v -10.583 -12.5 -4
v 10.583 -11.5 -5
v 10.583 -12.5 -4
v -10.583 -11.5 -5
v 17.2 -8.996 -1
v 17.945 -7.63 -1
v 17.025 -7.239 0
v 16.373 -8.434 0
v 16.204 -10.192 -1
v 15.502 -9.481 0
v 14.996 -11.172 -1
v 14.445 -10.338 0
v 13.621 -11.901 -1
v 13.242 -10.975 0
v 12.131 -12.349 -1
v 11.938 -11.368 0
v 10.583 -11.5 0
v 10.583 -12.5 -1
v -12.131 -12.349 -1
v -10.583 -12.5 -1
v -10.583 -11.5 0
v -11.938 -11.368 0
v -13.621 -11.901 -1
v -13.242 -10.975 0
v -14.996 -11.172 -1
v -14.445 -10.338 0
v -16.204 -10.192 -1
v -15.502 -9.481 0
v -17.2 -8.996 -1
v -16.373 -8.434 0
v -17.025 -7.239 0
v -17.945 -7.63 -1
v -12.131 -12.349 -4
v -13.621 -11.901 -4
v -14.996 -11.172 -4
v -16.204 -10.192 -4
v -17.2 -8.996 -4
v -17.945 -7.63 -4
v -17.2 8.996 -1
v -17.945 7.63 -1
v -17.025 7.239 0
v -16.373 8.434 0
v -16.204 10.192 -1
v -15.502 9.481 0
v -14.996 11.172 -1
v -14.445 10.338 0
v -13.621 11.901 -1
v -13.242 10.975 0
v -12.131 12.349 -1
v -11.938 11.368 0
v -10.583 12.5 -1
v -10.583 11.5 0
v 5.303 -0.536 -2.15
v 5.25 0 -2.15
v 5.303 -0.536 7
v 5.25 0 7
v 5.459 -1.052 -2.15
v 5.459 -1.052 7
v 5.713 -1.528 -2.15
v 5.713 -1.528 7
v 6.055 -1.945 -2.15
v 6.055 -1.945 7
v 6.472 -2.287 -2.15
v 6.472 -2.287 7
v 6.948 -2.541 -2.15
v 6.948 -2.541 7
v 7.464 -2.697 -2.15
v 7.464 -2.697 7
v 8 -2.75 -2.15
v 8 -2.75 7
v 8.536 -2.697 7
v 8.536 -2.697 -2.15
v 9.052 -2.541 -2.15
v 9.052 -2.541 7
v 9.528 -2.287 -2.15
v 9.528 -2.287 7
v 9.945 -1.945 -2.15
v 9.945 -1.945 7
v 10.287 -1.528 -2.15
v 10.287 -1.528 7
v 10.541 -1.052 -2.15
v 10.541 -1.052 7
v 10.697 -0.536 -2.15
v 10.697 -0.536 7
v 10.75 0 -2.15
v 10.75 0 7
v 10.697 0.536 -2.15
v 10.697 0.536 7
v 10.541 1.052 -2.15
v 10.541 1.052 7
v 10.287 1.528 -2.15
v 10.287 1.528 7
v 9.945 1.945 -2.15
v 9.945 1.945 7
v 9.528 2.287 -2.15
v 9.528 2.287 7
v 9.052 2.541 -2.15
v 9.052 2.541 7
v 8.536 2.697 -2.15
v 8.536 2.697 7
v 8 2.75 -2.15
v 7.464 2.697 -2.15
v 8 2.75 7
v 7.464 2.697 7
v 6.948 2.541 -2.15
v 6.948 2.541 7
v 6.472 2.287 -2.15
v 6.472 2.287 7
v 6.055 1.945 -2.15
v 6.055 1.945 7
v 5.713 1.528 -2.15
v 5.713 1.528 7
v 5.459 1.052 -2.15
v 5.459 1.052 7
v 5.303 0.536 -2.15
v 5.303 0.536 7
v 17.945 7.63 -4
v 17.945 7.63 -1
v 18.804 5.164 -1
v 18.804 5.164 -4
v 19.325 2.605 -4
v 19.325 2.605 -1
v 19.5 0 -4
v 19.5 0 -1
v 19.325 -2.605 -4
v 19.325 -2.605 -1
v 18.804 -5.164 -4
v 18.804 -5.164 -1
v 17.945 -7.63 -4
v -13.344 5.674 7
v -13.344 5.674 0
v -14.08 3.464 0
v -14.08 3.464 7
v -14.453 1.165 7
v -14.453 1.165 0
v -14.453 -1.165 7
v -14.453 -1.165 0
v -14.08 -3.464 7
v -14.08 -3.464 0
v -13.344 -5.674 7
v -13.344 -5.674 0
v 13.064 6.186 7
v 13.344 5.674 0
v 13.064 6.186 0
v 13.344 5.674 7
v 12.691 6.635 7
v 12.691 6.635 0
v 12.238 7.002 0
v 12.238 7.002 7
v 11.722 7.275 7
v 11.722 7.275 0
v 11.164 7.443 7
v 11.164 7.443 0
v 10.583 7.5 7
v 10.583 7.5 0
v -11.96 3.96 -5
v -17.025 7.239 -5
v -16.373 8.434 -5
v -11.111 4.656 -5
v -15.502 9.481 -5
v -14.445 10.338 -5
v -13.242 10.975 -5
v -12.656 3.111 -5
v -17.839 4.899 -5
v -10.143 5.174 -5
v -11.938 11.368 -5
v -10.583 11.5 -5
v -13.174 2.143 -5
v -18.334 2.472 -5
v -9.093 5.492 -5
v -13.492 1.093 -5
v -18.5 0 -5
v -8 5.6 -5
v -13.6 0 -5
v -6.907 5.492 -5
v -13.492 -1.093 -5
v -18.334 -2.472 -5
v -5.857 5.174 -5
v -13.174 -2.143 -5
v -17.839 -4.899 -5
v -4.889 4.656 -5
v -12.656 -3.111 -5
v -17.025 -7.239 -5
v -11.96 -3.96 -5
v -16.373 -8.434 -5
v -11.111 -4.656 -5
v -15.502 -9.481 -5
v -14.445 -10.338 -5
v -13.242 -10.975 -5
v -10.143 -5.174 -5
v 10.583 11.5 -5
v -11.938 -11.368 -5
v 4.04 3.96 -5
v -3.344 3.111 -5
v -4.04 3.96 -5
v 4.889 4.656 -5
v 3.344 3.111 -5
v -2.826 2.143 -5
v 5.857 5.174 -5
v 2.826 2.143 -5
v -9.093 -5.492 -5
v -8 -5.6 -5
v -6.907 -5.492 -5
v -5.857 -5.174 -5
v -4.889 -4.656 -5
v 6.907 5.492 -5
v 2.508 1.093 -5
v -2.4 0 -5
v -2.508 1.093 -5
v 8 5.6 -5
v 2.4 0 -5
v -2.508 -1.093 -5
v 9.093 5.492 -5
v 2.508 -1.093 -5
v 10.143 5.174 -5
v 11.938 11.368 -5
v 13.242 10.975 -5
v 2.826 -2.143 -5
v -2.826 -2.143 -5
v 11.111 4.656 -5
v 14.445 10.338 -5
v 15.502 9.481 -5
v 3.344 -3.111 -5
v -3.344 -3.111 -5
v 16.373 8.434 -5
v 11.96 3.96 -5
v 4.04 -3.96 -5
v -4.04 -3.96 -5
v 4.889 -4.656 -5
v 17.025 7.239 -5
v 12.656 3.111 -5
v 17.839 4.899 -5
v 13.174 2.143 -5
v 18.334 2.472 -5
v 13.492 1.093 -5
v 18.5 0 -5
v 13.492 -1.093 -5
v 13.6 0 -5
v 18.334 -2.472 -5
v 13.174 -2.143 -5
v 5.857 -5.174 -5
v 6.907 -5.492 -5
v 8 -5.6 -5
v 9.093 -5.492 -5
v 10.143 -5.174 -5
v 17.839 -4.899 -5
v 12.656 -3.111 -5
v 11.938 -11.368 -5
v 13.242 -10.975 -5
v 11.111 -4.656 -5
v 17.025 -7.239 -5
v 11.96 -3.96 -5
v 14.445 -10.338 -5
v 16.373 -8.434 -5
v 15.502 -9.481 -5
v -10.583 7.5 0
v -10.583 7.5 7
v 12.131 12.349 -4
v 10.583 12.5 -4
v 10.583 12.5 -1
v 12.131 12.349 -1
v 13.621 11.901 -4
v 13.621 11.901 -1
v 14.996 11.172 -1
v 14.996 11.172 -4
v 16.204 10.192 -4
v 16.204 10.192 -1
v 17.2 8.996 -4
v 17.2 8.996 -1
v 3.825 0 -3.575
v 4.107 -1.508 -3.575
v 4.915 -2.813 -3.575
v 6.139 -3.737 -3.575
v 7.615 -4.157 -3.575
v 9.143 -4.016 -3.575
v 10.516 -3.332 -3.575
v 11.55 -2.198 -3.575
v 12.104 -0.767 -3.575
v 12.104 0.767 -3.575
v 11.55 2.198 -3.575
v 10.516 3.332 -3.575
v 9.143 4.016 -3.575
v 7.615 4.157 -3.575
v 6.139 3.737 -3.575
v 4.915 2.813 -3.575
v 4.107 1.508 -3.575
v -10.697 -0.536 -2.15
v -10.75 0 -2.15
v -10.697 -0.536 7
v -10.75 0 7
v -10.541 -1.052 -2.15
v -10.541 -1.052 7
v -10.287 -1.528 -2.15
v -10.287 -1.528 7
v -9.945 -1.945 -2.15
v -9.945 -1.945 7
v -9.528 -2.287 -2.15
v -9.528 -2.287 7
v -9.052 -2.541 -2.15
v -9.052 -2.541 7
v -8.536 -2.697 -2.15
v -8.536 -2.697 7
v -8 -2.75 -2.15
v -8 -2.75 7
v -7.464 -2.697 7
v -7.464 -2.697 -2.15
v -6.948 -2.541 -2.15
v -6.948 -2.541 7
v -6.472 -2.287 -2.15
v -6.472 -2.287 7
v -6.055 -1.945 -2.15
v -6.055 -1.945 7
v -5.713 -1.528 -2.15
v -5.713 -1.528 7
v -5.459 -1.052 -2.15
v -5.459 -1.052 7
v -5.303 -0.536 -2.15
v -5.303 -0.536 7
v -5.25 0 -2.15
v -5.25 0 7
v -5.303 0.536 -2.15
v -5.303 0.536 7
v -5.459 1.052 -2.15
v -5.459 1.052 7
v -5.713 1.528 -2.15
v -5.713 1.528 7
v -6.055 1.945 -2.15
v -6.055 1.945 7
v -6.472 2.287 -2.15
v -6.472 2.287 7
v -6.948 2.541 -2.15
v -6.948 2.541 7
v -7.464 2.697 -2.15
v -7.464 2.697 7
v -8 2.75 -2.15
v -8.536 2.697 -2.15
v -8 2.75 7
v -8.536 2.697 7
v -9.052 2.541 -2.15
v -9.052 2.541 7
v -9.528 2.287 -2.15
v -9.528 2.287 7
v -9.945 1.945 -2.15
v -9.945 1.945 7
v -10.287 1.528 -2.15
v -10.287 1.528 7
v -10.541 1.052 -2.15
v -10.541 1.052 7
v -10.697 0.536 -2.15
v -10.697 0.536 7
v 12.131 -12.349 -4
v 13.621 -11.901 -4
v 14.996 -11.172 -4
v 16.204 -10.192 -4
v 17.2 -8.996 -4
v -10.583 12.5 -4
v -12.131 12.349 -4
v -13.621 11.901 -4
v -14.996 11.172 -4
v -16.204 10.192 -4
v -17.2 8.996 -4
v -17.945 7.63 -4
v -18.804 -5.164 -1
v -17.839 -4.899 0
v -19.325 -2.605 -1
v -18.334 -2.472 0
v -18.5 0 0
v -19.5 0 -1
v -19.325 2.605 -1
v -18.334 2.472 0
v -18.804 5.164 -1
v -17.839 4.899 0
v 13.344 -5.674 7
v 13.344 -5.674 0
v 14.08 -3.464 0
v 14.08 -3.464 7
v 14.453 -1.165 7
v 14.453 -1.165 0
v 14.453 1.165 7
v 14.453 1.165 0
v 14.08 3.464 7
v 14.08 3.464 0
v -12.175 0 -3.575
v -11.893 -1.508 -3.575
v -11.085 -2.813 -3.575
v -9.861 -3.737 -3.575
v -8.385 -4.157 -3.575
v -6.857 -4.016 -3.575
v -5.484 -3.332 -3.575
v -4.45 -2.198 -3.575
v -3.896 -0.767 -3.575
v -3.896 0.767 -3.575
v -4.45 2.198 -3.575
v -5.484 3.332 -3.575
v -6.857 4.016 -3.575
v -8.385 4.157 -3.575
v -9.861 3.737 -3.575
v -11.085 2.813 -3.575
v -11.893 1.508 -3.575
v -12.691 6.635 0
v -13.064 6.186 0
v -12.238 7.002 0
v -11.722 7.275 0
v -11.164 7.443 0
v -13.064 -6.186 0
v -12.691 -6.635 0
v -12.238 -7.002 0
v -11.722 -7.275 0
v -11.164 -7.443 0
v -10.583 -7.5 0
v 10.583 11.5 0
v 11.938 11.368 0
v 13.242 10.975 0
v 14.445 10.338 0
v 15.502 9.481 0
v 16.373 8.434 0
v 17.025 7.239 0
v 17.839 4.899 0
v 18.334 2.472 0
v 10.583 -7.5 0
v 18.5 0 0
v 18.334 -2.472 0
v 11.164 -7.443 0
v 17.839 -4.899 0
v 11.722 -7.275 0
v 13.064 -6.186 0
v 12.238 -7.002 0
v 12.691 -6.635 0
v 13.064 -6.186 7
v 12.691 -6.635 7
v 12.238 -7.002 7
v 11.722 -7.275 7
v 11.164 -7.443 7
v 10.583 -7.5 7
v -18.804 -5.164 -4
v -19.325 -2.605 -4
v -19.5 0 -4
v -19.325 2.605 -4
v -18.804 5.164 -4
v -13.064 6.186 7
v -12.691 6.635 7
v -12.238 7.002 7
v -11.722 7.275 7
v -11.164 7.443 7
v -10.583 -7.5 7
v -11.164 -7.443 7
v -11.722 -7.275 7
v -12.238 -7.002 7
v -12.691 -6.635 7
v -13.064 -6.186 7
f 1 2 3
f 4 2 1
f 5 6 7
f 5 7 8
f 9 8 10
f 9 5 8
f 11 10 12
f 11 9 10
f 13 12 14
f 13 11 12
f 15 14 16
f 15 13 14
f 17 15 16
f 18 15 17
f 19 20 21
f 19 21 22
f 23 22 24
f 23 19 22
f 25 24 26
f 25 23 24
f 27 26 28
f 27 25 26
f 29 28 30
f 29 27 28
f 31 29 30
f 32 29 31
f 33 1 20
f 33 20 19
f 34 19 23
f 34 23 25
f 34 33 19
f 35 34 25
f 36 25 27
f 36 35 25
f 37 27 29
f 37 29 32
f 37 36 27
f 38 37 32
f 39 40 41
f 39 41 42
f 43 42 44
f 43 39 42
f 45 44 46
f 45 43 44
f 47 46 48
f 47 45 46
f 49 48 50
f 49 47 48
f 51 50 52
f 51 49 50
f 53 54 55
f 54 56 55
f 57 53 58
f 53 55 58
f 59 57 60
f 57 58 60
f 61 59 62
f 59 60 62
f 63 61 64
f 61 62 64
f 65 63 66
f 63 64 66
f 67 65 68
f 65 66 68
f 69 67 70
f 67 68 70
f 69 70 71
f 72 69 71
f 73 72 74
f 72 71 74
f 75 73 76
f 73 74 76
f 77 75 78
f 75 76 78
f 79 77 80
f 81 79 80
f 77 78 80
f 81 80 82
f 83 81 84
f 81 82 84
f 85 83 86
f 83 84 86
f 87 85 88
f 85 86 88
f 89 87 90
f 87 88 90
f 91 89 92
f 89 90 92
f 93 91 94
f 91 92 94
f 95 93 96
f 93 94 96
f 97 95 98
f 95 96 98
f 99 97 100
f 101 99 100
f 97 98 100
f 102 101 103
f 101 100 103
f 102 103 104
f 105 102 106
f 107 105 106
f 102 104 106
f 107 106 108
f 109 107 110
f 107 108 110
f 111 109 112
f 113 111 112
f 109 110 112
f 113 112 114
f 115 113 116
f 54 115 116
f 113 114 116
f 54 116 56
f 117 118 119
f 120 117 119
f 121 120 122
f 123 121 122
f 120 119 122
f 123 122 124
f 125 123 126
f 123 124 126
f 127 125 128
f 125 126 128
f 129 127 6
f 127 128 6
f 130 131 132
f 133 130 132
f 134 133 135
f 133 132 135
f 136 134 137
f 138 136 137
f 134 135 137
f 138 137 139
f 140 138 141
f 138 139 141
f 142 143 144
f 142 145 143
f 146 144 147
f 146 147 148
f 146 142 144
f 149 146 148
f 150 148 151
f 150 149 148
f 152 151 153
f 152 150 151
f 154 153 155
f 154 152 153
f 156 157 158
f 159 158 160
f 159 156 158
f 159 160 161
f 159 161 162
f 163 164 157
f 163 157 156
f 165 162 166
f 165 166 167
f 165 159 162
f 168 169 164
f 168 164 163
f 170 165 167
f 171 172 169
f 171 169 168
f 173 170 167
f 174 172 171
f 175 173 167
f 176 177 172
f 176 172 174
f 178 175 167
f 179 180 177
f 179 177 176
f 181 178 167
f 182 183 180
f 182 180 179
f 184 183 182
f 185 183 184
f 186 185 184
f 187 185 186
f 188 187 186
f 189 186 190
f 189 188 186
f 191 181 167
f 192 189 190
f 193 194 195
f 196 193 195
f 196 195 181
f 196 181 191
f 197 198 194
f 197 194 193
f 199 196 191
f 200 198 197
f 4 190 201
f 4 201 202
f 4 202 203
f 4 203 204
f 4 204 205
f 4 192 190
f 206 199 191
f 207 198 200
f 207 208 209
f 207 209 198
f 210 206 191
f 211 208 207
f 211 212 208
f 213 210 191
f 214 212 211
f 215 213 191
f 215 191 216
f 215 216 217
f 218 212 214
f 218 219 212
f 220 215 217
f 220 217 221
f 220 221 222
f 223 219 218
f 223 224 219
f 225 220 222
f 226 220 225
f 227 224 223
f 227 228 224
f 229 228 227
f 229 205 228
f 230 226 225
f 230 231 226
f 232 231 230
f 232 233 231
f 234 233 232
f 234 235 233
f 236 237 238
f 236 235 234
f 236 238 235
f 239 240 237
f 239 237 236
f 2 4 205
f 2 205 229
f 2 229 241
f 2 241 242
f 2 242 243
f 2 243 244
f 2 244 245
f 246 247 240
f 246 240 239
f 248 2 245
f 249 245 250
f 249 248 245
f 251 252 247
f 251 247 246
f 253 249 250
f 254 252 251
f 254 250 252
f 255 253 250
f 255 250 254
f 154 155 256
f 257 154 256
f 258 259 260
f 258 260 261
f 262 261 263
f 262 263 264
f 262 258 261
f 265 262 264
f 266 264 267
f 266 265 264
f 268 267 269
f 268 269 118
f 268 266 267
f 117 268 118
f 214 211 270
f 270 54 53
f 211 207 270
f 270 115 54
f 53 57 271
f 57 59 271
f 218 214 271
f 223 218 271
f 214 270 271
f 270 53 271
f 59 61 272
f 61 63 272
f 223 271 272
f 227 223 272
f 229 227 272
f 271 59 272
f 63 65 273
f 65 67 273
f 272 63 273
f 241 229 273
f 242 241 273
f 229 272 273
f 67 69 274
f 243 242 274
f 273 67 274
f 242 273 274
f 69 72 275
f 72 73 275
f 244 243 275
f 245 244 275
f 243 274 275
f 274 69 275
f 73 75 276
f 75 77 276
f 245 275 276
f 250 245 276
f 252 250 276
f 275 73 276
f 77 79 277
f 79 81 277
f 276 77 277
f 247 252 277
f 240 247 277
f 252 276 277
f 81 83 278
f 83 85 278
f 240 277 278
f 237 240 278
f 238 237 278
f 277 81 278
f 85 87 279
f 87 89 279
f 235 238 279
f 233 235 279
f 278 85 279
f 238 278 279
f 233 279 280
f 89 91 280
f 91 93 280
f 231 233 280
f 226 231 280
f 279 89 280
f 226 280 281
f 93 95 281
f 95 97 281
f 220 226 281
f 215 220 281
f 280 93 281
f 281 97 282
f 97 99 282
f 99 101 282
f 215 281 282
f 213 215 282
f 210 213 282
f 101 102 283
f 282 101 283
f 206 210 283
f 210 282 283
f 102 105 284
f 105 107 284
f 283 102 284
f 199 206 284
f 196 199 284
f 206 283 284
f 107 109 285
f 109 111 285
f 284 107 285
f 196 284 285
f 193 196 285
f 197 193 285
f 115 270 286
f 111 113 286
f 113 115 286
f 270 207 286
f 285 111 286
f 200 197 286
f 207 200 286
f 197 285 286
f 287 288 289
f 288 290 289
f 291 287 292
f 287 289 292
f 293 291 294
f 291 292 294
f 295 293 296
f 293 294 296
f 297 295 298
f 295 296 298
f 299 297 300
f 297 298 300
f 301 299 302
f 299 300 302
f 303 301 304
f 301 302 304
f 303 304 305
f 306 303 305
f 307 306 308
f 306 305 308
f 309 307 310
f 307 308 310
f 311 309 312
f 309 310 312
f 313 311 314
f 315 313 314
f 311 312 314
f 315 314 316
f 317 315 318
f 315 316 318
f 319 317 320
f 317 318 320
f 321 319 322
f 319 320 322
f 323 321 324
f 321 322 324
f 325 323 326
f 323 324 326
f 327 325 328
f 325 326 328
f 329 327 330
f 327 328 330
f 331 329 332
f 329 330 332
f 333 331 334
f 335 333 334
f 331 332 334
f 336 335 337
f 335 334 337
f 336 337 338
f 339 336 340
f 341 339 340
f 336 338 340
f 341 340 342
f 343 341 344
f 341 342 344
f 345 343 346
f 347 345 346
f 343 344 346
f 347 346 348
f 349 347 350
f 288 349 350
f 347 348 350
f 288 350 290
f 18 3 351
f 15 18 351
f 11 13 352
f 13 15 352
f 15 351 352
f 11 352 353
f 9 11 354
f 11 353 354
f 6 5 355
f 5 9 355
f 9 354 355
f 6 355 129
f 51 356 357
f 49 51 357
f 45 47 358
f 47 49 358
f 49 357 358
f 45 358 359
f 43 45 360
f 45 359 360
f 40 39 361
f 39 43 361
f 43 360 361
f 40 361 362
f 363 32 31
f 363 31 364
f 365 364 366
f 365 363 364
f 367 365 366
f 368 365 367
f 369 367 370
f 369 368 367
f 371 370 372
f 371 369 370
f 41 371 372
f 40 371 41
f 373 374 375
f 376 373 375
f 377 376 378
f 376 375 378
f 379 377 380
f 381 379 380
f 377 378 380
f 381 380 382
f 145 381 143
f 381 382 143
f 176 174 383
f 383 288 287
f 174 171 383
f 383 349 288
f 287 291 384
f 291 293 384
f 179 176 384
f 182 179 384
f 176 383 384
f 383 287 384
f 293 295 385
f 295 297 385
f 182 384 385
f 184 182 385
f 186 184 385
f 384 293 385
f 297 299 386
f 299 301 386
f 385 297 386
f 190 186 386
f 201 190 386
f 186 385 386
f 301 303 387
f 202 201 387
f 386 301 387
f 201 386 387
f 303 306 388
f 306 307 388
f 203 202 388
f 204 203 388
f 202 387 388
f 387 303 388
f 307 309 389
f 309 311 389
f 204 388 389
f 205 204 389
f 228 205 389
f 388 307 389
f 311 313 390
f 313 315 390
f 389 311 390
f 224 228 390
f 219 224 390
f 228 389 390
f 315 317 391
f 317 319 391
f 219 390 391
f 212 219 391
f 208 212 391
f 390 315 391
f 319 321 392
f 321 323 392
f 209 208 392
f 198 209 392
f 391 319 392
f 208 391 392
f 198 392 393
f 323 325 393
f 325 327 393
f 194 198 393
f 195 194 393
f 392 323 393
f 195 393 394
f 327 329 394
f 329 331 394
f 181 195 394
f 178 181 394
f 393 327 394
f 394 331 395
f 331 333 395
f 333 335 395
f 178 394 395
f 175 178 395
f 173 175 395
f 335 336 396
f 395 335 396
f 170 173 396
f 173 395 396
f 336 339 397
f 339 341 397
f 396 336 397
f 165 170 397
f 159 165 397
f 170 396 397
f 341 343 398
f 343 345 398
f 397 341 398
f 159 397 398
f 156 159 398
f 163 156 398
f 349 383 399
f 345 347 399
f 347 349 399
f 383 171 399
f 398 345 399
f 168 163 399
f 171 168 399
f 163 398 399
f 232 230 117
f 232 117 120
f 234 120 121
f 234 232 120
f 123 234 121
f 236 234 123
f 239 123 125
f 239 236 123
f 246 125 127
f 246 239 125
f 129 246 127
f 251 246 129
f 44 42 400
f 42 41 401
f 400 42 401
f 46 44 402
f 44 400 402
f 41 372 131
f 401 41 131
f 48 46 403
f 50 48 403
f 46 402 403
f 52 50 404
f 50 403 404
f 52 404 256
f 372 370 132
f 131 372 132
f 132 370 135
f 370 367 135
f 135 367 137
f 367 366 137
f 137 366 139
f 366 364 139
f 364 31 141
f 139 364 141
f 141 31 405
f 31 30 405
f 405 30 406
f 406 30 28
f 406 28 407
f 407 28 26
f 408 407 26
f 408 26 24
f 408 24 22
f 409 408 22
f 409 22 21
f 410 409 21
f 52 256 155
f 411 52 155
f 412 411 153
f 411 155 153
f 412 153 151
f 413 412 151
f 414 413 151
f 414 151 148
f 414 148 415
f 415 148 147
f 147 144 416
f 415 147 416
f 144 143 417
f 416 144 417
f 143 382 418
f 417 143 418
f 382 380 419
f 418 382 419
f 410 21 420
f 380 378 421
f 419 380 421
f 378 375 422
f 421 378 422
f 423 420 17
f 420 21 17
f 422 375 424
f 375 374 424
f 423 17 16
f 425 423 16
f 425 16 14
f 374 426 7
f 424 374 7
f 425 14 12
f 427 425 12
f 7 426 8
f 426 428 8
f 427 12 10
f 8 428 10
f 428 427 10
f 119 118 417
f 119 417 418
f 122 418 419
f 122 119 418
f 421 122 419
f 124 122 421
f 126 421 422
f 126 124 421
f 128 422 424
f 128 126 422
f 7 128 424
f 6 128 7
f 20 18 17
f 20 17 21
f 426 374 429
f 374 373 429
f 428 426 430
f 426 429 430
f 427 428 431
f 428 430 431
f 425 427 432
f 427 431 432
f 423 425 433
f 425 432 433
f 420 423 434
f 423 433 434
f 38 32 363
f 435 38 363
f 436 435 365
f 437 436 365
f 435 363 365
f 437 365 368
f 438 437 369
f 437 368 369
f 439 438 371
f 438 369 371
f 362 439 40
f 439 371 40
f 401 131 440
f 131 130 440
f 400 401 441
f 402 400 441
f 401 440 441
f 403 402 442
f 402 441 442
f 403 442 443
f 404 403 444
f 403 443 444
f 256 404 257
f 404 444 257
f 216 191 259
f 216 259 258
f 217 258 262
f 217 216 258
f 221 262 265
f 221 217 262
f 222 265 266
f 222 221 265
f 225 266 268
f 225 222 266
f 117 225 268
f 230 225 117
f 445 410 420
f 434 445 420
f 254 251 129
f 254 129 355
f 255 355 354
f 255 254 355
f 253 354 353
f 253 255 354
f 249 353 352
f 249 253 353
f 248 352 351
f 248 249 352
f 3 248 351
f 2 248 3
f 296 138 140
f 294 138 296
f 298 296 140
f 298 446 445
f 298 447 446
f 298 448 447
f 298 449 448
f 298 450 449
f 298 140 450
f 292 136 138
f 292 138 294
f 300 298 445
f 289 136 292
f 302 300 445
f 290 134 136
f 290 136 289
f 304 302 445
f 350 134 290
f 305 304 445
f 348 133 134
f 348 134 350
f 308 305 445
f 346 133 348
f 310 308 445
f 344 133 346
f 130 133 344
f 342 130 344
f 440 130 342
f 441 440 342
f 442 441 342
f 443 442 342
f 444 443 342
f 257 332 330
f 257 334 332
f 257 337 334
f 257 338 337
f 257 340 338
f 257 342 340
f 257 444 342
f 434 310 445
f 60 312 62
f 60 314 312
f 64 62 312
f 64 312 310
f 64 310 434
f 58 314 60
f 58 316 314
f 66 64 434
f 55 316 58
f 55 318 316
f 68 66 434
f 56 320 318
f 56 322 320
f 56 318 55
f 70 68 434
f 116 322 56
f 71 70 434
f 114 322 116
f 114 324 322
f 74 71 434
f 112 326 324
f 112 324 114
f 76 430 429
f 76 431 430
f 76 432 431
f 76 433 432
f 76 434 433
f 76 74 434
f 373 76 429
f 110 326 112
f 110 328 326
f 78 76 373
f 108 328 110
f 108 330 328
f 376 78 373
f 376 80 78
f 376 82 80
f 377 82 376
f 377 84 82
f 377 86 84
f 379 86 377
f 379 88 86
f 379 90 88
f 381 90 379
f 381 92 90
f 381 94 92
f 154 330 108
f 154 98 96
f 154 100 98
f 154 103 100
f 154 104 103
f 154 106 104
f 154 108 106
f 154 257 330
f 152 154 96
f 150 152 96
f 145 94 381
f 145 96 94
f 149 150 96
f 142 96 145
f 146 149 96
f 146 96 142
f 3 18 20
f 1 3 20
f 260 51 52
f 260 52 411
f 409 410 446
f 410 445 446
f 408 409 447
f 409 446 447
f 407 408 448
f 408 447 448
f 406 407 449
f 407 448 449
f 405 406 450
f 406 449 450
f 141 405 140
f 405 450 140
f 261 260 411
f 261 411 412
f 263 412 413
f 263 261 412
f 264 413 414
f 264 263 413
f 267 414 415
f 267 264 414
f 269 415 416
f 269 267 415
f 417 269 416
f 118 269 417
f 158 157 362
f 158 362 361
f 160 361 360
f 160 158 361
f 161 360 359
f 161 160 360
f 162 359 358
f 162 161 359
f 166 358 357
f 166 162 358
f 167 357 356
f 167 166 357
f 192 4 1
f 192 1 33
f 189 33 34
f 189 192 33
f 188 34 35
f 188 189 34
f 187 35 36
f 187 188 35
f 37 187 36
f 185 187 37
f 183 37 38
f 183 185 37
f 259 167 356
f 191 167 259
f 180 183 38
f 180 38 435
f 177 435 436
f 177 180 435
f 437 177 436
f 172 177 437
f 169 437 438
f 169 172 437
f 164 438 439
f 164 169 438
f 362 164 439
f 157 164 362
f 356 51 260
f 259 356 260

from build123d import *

# Parameters (mm, degrees)
F1_DEPTH       = 7
F3_DEPTH       = 5
F5_D           = 5.5
F5_CSINK_D     = 11.2
F5_CSINK_ANGLE = 90
F6_R           = 8
F7_R           = 3
F8_SIZE        = 1


with BuildPart() as f1:
    # F0 (on Top) → F1 (new body)
    with BuildSketch(Plane.XY):
        with BuildLine():
            Line((12.409673646, 7.5), (-12.409673646, 7.5))
            ThreePointArc((-12.409673646, 7.5), (-14.5, 0), (-12.409673646, -7.5))
            Line((-12.409673646, -7.5), (12.409673646, -7.5))
            ThreePointArc((12.409673646, -7.5), (14.5, 0), (12.409673646, 7.5))
        make_face()
    extrude(amount=F1_DEPTH)

    # F2 (on face) → F3 (join)
    with BuildSketch(Plane(origin=(0, 0, 0), x_dir=(1, 0, 0), z_dir=(0, 0, -1))):
        with BuildLine():
            Line((14.9666296342, 12.5000001863), (-14.9666296342, 12.5000001863))
            ThreePointArc((-14.9666296342, 12.5000001863), (-19.5000001863, 0), (-14.9666296342, -12.5000001863))
            Line((-14.9666296342, -12.5000001863), (14.9666296342, -12.5000001863))
            ThreePointArc((14.9666296342, -12.5000001863), (19.5000001863, 0), (14.9666296342, 12.5000001863))
        make_face()
        with BuildLine():
            Line((-12.409673646, 7.5), (12.409673646, 7.5))
            ThreePointArc((12.409673646, 7.5), (14.5, 0), (12.409673646, -7.5))
            Line((12.409673646, -7.5), (-12.409673646, -7.5))
            ThreePointArc((-12.409673646, -7.5), (-14.5, 0), (-12.409673646, 7.5))
        make_face(mode=Mode.SUBTRACT)
        with BuildLine():
            ThreePointArc((12.409673646, -7.5), (14.5, 0), (12.409673646, 7.5))
            Line((12.409673646, 7.5), (-12.409673646, 7.5))
            ThreePointArc((-12.409673646, 7.5), (-14.5, 0), (-12.409673646, -7.5))
            Line((-12.409673646, -7.5), (12.409673646, -7.5))
        make_face()
    extrude(amount=F3_DEPTH)

    # F5 (through all)
    with Locations(Plane(origin=(0, 0, -5), x_dir=(1, 0, 0), z_dir=(0, 0, -1))):
        with Locations((-8, 0), (8, 0)):
            CounterSinkHole(F5_D / 2, F5_CSINK_D / 2, counter_sink_angle=F5_CSINK_ANGLE)

    # F6
    f6_edges = [f1.edges().sort_by_distance(p)[0] for p in [
        (14.96663, -12.5, -2.5),
        (14.96663, 12.5, -2.5),
        (-14.96663, 12.5, -2.5),
        (-14.96663, -12.5, -2.5),
    ]]
    fillet(f6_edges, radius=F6_R)

    # F7
    f7_edges = [f1.edges().sort_by_distance(p)[0] for p in [
        (12.409674, -7.5, 3.5),
        (12.409674, 7.5, 3.5),
        (-12.409674, 7.5, 3.5),
        (-12.409674, -7.5, 3.5),
    ]]
    fillet(f7_edges, radius=F7_R)

    # F8
    f8_edges = [f1.edges().sort_by_distance(p)[0] for p in [
        (0, -12.5, -5),
        (-19.5, 0, -5),
        (0, 12.5, -5),
        (19.5, 0, -5),
        (19.5, 0, 0),
        (0, -12.5, 0),
        (-19.5, 0, 0),
        (0, 12.5, 0),
    ]]
    chamfer(f8_edges, length=F8_SIZE)


solid = f1.part
